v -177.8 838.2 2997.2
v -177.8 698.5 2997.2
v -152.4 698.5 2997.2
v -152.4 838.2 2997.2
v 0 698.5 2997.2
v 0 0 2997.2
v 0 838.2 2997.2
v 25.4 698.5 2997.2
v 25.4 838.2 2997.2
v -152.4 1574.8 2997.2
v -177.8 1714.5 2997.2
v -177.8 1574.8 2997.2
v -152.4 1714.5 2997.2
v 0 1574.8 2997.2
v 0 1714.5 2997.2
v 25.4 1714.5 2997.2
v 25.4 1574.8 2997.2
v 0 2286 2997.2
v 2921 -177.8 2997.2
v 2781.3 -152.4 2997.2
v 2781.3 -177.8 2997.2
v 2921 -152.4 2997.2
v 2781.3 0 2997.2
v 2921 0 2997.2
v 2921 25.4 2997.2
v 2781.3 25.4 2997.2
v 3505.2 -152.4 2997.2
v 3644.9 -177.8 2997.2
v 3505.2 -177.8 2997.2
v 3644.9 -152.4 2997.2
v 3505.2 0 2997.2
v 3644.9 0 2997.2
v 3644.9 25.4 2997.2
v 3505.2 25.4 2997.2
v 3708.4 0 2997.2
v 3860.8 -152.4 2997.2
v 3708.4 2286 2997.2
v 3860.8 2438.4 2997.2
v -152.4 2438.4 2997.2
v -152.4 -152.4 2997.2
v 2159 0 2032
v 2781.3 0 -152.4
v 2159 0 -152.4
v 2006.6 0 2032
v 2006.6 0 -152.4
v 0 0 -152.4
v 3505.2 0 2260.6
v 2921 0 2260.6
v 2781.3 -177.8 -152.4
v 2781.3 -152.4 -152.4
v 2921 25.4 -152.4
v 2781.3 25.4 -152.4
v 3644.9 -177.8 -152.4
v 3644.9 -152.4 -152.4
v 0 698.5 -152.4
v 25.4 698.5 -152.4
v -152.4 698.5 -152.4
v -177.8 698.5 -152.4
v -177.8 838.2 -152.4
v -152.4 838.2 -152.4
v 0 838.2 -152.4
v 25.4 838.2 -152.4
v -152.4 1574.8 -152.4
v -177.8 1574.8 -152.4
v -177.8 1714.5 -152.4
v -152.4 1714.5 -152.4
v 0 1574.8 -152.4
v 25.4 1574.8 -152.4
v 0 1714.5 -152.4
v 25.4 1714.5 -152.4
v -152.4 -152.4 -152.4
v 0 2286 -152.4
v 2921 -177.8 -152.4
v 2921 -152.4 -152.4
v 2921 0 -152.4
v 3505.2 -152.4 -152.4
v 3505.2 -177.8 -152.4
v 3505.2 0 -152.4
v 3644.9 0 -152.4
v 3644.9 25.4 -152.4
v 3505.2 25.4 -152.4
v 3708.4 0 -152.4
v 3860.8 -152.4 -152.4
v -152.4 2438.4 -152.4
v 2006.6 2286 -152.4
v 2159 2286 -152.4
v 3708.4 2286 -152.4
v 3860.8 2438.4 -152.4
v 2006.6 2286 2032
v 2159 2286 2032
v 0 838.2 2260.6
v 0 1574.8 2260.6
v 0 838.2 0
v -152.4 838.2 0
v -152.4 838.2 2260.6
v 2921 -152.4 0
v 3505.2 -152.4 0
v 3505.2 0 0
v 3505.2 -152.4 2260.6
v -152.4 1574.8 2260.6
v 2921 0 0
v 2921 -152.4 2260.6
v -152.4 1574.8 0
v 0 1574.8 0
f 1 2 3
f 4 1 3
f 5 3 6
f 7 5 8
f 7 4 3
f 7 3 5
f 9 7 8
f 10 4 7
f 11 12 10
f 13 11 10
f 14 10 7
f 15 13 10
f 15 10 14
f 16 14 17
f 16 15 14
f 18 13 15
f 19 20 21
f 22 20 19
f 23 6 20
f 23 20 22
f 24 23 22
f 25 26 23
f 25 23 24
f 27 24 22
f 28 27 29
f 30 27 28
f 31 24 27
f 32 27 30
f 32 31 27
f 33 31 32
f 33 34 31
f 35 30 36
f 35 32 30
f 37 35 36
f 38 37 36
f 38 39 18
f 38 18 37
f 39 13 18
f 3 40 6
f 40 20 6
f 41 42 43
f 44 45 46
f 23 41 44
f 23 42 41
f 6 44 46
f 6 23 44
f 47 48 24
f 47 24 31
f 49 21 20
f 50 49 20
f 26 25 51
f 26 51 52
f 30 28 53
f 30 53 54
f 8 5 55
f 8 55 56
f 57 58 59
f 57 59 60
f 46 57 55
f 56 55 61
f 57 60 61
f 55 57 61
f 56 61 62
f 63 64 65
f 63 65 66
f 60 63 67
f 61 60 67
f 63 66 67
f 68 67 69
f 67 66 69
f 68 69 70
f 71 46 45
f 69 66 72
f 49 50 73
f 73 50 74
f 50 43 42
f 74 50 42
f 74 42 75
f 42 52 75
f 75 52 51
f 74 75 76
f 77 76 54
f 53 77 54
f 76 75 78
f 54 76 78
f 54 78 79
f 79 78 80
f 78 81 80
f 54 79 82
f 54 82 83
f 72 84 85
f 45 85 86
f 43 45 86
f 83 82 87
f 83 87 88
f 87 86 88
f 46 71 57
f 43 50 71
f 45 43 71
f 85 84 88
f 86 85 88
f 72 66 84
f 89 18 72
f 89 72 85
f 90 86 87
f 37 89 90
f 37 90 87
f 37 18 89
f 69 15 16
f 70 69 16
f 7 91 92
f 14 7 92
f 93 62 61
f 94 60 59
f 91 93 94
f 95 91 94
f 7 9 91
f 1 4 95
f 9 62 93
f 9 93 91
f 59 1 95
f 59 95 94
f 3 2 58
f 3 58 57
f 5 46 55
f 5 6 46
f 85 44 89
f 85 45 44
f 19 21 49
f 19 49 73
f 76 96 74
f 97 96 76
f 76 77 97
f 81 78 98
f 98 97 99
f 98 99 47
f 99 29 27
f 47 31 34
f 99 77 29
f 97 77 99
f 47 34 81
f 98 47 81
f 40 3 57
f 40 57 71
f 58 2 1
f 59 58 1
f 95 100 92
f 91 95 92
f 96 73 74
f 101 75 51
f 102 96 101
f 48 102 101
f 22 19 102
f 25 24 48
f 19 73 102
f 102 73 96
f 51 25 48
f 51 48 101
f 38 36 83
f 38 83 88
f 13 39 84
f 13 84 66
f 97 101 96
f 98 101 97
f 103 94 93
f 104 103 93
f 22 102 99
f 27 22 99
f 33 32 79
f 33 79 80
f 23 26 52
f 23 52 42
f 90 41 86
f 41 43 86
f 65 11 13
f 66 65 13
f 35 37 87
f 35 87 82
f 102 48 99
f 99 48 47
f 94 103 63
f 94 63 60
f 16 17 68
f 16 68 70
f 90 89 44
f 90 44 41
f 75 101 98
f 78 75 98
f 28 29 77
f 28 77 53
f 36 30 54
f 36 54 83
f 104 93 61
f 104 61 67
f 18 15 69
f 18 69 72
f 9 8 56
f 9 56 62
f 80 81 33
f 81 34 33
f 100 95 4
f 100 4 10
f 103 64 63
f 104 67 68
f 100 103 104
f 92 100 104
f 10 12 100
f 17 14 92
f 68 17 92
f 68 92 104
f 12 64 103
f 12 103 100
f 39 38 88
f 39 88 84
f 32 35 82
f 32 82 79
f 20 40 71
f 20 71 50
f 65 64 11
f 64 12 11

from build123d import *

# Parameters (mm, degrees)
F0_W     = 152.4
F0_H     = 139.7
F0_W_2   = 25.4
F0_W_3   = 139.7
F0_H_2   = 152.4
F0_H_3   = 25.4
F1_DEPTH = 2997.2
F2_START = 2260.6
F0_H_4   = 736.6
F0_W_4   = 584.2
F2_DEPTH = 736.6
F0_H_5   = 2286
F3_DEPTH = 152.4
F4_DEPTH = 2032


with BuildPart() as f1:
    # F0 (on Top) → F1 (new body)
    with BuildSketch(Plane.XY):
        Polygon((2006.6, 0), (0, 0), (0, 698.5), (-152.4, 698.5), (-152.4, -152.4), (2781.3, -152.4), (2781.3, 0), (2159, 0), align=None)
        with Locations((-76.2, 768.35)):
            Rectangle(F0_W, F0_H)
        with Locations((12.7, 768.35)):
            Rectangle(F0_W_2, F0_H)
        with Locations((-165.1, 768.35)):
            Rectangle(F0_W_2, F0_H)
        Polygon((2781.3, 25.4), (2781.3, 0), (2921, 0), (2921, 25.4), (2844.8, 25.4), align=None)
        with Locations((2851.15, -76.2)):
            Rectangle(F0_W_3, F0_H_2)
        with Locations((2851.15, -165.1)):
            Rectangle(F0_W_3, F0_H_3)
    extrude(amount=F1_DEPTH)



with BuildPart() as f1b:
    # F0 (on Top) → F1, piece 2 (new body)
    with BuildSketch(Plane.XY):
        Polygon((0, 2286), (2006.6, 2286), (2159, 2286), (3708.4, 2286), (3708.4, 0), (3644.9, 0), (3644.9, -152.4), (3860.8, -152.4), (3860.8, 2438.4), (-152.4, 2438.4), (-152.4, 1714.5), (0, 1714.5), align=None)
        with Locations((-76.2, 1644.65)):
            Rectangle(F0_W, F0_H)
        with Locations((12.7, 1644.65)):
            Rectangle(F0_W_2, F0_H)
        with Locations((-165.1, 1644.65)):
            Rectangle(F0_W_2, F0_H)
        with Locations((3575.05, 12.7)):
            Rectangle(F0_W_3, F0_H_3)
        with Locations((3575.05, -76.2)):
            Rectangle(F0_W_3, F0_H_2)
        with Locations((3575.05, -165.1)):
            Rectangle(F0_W_3, F0_H_3)
    extrude(amount=F1_DEPTH)


with BuildPart() as f1_1:
    add(f1.part)

    add(f1b.part)  # F2 merges F1b
    # F0 (on Top) → F2 (join)
    with BuildSketch(Plane.XY.offset(F2_START)):
        with Locations((-76.2, 1206.5)):
            Rectangle(F0_W, F0_H_4)
        with Locations((3213.1, -76.2)):
            Rectangle(F0_W_4, F0_H_2)
    extrude(amount=F2_DEPTH)

    # F0 (on Top) → F3 (join)
    with BuildSketch(Plane.XY):
        Polygon((2006.6, 0), (0, 0), (0, 698.5), (-152.4, 698.5), (-152.4, -152.4), (2781.3, -152.4), (2781.3, 0), (2159, 0), align=None)
        with Locations((2082.8, 1143)):
            Rectangle(F0_W, F0_H_5)
        with Locations((-76.2, 768.35)):
            Rectangle(F0_W, F0_H)
        with Locations((12.7, 768.35)):
            Rectangle(F0_W_2, F0_H)
        Polygon((0, 2286), (2006.6, 2286), (2159, 2286), (3708.4, 2286), (3708.4, 0), (3644.9, 0), (3644.9, -152.4), (3860.8, -152.4), (3860.8, 2438.4), (-152.4, 2438.4), (-152.4, 1714.5), (0, 1714.5), align=None)
        with Locations((-76.2, 1206.5)):
            Rectangle(F0_W, F0_H_4)
        with Locations((-165.1, 768.35)):
            Rectangle(F0_W_2, F0_H)
        Polygon((2781.3, 25.4), (2781.3, 0), (2921, 0), (2921, 25.4), (2844.8, 25.4), align=None)
        with Locations((2851.15, -76.2)):
            Rectangle(F0_W_3, F0_H_2)
        with Locations((-76.2, 1644.65)):
            Rectangle(F0_W, F0_H)
        with Locations((12.7, 1644.65)):
            Rectangle(F0_W_2, F0_H)
        with Locations((3213.1, -76.2)):
            Rectangle(F0_W_4, F0_H_2)
        with Locations((2851.15, -165.1)):
            Rectangle(F0_W_3, F0_H_3)
        with Locations((-165.1, 1644.65)):
            Rectangle(F0_W_2, F0_H)
        with Locations((3575.05, 12.7)):
            Rectangle(F0_W_3, F0_H_3)
        with Locations((3575.05, -76.2)):
            Rectangle(F0_W_3, F0_H_2)
        with Locations((3575.05, -165.1)):
            Rectangle(F0_W_3, F0_H_3)
    extrude(amount=-F3_DEPTH)

    # F0 (on Top) → F4 (join)
    with BuildSketch(Plane.XY):
        with Locations((2082.8, 1143)):
            Rectangle(F0_W, F0_H_5)
    extrude(amount=F4_DEPTH)


solid = f1_1.part
